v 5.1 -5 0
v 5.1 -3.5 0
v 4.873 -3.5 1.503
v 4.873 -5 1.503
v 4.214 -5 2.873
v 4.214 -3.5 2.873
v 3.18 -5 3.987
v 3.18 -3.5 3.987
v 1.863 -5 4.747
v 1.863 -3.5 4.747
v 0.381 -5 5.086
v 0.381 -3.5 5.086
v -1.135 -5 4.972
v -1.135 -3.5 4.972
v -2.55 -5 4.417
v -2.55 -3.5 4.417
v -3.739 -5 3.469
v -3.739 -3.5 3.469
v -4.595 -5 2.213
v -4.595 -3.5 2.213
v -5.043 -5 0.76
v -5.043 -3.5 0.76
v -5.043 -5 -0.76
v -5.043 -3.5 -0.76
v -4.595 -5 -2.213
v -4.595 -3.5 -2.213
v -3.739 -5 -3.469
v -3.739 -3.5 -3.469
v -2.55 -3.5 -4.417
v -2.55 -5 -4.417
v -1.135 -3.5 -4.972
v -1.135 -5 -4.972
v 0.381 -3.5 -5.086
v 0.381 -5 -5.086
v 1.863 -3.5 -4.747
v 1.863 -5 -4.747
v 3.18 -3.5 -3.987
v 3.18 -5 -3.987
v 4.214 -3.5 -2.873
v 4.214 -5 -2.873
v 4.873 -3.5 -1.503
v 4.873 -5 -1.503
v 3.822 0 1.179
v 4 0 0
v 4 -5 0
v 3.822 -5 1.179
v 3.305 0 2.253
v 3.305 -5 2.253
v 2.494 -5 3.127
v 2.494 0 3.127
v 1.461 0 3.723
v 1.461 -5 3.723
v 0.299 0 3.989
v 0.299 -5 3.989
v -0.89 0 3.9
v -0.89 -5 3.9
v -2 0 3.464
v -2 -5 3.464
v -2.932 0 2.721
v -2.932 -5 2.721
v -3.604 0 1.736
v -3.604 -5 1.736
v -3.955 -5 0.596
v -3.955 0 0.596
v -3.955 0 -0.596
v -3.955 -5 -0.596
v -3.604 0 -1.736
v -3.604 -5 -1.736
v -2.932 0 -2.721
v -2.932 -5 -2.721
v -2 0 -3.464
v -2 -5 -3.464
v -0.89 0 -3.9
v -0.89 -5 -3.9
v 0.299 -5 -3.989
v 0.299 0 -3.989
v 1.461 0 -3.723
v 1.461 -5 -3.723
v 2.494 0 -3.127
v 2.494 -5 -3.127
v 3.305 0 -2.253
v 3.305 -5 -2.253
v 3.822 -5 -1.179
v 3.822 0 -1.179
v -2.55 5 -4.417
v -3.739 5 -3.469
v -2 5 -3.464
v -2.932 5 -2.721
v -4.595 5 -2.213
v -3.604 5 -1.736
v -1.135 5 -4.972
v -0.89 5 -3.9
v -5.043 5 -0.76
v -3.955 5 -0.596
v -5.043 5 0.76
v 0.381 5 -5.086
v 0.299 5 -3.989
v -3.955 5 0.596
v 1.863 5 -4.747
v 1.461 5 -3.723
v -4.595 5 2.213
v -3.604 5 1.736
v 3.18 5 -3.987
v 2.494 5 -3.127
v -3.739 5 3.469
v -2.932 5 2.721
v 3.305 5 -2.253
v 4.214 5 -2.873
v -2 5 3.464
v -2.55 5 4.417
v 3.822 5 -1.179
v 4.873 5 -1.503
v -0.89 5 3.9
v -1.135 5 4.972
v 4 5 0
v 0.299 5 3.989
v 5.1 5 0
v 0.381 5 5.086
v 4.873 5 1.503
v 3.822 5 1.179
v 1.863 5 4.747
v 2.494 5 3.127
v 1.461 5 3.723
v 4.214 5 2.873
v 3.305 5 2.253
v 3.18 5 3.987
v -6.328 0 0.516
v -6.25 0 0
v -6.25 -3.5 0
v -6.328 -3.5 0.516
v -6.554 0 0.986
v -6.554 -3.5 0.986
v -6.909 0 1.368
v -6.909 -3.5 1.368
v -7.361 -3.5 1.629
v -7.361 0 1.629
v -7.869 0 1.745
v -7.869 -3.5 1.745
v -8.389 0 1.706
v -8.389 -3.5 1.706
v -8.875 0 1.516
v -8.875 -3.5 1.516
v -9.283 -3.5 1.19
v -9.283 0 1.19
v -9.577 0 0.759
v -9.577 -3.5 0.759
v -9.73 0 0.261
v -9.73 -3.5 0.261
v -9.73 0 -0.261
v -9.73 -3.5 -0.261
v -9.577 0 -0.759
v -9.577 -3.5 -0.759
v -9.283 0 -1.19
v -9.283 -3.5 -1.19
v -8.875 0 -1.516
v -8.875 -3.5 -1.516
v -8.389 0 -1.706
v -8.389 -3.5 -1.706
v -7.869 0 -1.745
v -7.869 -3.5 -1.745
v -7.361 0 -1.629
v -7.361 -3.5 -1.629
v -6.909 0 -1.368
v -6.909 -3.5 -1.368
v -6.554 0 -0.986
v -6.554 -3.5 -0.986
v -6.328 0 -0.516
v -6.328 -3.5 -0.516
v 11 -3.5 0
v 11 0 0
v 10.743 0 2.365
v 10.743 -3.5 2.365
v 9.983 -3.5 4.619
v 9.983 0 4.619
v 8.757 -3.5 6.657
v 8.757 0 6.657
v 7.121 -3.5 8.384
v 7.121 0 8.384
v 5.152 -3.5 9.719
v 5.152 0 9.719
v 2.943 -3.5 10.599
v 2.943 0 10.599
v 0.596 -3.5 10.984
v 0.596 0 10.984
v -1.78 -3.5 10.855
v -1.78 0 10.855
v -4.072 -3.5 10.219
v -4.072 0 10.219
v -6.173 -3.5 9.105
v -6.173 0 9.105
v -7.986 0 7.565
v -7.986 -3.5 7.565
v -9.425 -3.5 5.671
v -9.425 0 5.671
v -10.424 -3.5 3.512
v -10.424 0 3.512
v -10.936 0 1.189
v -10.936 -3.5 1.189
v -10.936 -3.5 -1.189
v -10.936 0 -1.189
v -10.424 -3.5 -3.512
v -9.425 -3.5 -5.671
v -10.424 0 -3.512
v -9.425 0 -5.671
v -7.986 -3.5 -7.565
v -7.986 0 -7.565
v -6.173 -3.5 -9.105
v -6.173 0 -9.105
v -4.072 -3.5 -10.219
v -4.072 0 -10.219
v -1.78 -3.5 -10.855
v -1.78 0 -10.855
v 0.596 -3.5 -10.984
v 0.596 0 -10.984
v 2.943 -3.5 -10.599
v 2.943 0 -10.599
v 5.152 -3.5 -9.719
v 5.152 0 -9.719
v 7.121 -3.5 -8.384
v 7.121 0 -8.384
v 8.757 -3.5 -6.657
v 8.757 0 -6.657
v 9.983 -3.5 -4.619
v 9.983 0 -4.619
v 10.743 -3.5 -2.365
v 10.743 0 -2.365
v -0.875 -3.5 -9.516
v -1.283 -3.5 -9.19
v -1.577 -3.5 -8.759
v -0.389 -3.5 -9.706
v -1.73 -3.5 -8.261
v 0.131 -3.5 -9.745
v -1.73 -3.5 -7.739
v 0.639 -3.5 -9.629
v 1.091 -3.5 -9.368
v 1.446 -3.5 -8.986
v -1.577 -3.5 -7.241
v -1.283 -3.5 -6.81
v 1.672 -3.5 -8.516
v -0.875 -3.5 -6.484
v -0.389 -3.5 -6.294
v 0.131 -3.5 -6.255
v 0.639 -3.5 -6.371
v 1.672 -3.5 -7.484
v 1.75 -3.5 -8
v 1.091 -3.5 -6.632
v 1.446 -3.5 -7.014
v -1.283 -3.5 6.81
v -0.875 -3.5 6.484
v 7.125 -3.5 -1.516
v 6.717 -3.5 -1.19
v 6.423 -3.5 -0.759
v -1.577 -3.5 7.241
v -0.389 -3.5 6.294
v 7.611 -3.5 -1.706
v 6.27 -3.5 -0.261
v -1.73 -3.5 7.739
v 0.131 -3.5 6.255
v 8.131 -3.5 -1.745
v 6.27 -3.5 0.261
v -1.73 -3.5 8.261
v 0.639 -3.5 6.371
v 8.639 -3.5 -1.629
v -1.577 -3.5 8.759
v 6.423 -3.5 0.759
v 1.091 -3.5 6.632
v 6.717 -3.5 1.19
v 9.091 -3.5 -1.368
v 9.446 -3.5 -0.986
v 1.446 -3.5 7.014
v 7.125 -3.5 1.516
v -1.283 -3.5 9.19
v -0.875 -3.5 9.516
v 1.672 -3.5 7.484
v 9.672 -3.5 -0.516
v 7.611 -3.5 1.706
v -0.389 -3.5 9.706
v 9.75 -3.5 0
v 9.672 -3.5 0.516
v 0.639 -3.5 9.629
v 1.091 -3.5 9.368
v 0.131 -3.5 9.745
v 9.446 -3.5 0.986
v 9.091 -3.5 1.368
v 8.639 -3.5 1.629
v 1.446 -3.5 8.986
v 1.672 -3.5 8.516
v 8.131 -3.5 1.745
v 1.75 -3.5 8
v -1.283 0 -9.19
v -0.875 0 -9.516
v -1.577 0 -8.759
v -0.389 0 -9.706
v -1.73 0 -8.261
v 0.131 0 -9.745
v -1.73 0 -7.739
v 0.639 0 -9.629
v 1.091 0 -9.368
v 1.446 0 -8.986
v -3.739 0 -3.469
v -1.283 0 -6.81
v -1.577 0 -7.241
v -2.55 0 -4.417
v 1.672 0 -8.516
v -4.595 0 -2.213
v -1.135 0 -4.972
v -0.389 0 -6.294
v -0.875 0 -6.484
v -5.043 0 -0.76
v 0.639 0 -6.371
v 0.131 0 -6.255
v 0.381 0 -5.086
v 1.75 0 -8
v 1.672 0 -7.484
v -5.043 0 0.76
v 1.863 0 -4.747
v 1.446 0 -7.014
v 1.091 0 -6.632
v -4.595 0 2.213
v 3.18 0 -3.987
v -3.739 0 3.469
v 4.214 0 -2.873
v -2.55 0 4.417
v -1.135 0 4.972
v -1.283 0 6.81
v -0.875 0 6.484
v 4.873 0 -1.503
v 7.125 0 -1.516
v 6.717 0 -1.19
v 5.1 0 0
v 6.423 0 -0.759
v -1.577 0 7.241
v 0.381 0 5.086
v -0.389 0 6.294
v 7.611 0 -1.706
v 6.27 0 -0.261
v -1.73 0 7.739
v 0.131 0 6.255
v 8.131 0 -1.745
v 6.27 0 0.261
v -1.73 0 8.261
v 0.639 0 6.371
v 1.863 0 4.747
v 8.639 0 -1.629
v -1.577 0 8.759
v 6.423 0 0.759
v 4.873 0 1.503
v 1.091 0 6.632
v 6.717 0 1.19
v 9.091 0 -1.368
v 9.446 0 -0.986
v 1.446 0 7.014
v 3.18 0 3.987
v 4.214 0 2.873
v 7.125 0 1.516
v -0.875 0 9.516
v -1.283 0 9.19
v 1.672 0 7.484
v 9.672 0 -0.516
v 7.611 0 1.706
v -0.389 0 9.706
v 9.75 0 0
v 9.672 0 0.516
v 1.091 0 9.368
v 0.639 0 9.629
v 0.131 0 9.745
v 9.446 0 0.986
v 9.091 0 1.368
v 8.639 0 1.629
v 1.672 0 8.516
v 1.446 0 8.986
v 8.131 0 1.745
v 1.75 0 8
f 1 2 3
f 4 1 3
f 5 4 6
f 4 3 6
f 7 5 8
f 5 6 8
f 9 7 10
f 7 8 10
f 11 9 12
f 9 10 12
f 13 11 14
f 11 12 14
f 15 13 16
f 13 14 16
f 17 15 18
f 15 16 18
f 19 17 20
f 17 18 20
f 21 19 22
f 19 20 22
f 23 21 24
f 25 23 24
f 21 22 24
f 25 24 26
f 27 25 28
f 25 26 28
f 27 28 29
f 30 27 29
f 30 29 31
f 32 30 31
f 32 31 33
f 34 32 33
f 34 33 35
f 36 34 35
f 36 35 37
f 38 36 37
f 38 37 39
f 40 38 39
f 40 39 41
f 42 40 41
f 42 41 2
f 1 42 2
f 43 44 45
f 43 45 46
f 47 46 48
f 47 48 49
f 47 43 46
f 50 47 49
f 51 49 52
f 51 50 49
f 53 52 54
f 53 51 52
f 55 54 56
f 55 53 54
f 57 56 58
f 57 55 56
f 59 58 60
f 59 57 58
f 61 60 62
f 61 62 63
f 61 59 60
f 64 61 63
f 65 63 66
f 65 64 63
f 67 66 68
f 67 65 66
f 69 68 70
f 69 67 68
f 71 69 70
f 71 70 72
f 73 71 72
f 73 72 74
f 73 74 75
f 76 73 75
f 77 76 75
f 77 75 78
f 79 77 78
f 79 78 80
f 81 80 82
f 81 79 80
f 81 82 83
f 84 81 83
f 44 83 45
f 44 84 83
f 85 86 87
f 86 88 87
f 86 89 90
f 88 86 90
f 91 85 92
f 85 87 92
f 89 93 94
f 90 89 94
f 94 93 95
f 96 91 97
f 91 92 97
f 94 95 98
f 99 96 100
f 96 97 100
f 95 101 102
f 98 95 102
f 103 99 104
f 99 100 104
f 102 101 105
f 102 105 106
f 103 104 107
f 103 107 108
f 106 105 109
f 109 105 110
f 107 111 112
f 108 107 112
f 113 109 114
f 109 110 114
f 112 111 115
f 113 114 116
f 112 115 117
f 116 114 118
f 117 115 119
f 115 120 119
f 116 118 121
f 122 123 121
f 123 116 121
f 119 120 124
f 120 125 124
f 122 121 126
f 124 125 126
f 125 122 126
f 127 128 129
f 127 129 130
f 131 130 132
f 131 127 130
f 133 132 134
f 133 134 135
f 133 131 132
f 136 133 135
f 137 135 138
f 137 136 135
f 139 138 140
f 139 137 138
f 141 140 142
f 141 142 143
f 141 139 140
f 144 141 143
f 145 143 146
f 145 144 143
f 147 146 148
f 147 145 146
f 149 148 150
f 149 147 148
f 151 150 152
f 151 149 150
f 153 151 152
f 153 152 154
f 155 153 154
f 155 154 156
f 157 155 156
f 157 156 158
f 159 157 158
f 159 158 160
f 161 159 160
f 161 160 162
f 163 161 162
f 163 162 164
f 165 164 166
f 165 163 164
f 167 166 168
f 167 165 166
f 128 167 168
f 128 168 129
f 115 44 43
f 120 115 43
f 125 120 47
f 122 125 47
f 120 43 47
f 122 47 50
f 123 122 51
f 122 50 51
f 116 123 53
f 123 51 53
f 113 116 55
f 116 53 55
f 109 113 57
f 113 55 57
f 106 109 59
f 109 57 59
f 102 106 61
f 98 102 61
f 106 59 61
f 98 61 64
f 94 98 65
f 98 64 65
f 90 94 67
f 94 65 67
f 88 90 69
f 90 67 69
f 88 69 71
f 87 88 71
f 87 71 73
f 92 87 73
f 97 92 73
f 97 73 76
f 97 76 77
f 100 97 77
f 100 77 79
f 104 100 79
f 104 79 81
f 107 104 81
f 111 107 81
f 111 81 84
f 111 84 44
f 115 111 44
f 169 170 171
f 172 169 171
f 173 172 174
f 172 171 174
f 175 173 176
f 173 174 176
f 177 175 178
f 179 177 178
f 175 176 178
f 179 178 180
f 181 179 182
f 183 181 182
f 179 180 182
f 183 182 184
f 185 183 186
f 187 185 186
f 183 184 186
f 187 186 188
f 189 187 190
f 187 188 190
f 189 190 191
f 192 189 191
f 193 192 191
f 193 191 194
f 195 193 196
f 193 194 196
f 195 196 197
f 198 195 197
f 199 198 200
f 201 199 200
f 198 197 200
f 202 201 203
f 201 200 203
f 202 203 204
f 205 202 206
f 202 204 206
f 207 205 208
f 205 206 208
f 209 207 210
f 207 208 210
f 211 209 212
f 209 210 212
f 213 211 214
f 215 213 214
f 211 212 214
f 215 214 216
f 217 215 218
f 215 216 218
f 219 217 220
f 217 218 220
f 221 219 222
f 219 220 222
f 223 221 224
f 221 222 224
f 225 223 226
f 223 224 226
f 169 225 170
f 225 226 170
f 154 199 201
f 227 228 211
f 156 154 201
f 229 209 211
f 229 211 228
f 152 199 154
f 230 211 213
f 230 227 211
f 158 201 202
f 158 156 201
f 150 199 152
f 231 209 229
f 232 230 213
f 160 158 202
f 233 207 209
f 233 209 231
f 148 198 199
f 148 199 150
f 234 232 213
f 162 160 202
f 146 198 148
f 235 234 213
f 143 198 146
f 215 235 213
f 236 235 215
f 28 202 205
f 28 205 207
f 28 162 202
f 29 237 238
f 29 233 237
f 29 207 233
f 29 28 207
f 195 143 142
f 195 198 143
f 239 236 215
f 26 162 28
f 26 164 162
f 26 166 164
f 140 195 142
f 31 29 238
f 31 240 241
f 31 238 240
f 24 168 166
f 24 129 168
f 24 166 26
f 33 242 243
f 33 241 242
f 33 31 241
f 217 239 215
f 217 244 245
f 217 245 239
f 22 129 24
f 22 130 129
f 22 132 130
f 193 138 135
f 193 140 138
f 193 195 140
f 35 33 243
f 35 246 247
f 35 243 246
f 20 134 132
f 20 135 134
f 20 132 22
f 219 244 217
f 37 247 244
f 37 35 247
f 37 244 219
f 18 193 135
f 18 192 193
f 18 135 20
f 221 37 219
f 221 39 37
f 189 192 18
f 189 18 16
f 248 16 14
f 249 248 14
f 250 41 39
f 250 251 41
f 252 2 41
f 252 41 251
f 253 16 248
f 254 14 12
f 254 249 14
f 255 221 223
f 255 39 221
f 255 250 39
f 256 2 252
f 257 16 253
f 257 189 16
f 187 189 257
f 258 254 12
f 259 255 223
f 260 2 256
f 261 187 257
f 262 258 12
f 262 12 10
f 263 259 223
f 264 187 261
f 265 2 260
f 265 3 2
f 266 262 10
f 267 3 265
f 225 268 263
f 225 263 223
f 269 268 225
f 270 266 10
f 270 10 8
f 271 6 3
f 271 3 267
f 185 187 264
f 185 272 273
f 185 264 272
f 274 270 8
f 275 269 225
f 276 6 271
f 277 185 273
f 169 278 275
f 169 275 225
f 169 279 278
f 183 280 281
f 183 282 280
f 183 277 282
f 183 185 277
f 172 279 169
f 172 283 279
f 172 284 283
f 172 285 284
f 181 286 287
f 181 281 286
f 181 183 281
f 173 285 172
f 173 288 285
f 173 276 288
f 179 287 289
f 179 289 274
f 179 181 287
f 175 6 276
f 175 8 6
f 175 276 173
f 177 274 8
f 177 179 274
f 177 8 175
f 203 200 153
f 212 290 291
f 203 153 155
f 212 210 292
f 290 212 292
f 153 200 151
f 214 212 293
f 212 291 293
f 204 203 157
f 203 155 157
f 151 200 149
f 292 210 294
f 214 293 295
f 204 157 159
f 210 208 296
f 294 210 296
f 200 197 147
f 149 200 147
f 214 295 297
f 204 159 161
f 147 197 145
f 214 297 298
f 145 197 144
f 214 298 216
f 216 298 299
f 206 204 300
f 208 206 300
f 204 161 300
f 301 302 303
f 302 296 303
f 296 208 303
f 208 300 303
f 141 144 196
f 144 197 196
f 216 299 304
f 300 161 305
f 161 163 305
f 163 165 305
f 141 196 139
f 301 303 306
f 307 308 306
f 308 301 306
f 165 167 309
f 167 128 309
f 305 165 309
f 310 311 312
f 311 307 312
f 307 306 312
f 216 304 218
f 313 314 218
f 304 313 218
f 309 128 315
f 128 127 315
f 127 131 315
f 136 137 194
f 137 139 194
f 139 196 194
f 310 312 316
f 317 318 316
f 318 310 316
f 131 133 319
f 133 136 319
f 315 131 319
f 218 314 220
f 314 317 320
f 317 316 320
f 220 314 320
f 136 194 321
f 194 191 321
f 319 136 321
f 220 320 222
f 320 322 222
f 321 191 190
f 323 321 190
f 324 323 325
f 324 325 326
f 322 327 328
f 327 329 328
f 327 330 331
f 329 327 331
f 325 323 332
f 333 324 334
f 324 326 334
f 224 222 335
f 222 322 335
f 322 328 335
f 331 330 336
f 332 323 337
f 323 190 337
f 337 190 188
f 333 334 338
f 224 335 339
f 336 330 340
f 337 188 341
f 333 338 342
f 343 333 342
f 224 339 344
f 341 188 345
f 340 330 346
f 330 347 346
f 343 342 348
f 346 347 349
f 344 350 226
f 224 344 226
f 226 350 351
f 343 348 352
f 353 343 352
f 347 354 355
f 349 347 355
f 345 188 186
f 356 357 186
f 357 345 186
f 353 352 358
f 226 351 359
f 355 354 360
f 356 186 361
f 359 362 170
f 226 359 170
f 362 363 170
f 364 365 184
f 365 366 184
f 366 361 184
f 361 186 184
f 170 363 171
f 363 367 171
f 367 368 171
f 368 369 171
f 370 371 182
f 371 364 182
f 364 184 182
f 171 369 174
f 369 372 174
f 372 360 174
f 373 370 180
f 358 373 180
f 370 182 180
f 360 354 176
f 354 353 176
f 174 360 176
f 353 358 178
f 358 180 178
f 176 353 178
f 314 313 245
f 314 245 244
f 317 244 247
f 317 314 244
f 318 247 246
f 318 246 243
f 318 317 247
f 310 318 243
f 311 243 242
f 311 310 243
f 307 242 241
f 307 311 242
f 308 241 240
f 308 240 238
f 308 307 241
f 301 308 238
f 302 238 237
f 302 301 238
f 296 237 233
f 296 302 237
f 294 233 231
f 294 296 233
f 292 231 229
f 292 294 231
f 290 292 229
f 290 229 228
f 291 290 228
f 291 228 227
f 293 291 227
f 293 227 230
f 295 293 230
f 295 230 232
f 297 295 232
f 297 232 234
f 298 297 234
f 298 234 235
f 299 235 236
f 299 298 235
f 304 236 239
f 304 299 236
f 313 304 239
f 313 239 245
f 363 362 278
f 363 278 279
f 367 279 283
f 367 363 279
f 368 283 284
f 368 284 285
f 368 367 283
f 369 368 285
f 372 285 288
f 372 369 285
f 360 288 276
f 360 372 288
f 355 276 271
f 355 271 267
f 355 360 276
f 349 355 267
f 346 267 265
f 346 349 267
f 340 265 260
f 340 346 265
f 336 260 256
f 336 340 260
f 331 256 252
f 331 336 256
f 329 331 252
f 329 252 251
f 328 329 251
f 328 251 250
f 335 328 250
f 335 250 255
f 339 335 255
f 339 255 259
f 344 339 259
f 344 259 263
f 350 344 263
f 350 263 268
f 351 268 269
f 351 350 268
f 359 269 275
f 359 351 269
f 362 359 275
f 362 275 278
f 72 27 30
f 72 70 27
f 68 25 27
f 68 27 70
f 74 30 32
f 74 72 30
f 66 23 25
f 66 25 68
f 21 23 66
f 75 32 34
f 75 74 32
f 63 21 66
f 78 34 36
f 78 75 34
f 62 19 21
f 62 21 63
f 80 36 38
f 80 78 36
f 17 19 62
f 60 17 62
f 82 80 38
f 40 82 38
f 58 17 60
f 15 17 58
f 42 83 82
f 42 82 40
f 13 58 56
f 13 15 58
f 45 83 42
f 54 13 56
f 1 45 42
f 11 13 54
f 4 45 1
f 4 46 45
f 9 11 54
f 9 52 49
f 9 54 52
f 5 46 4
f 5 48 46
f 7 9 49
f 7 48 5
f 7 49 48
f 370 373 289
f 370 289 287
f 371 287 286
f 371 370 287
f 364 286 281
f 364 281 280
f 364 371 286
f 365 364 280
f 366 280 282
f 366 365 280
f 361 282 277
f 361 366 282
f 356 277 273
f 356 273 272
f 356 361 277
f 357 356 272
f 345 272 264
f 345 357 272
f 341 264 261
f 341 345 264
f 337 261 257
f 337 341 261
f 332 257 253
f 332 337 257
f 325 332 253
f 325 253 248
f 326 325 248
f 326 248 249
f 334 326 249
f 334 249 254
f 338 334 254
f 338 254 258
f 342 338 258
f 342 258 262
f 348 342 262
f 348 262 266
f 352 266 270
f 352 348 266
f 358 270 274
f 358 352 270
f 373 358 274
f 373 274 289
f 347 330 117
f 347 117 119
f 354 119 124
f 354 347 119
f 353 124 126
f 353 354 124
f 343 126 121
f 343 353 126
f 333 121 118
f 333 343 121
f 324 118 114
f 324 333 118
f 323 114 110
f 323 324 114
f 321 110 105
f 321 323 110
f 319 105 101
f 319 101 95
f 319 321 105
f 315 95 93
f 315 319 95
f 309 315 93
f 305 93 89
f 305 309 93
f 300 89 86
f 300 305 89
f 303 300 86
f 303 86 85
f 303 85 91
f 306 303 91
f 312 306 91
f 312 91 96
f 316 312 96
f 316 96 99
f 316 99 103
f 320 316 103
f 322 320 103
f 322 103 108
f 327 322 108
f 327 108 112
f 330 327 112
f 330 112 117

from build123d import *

# Parameters (mm, degrees)
F0_R        = 11
F0_R_2      = 1.75
F0_R_3      = 5.1
F1_DEPTH    = 3.5
F0_R_4      = 4
F2_DEPTH    = 5
F2_FACE_R   = 5.1
F2_FACE_R_2 = 4
F3_DEPTH    = 10


with BuildPart() as f1:
    # F0 (on Front) → F1 (new body)
    with BuildSketch(Plane.XZ):
        Circle(F0_R)
        with Locations((0, -8)):
            Circle(F0_R_2, mode=Mode.SUBTRACT)
        with Locations((-8, 0)):
            Circle(F0_R_2, mode=Mode.SUBTRACT)
        Circle(F0_R_3, mode=Mode.SUBTRACT)
        with Locations((8, 0)):
            Circle(F0_R_2, mode=Mode.SUBTRACT)
        with Locations((0, 8)):
            Circle(F0_R_2, mode=Mode.SUBTRACT)
    extrude(amount=F1_DEPTH)

    # F0 (on Front) → F2 (join)
    with BuildSketch(Plane.XZ):
        Circle(F0_R_3)
        Circle(F0_R_4, mode=Mode.SUBTRACT)
    extrude(amount=F2_DEPTH)

    # F2_face (on face) → F3 (join)
    with BuildSketch(Plane.XZ.offset(5)):
        Circle(F2_FACE_R)
        Circle(F2_FACE_R_2, mode=Mode.SUBTRACT)
    extrude(amount=-F3_DEPTH)


solid = f1.part
